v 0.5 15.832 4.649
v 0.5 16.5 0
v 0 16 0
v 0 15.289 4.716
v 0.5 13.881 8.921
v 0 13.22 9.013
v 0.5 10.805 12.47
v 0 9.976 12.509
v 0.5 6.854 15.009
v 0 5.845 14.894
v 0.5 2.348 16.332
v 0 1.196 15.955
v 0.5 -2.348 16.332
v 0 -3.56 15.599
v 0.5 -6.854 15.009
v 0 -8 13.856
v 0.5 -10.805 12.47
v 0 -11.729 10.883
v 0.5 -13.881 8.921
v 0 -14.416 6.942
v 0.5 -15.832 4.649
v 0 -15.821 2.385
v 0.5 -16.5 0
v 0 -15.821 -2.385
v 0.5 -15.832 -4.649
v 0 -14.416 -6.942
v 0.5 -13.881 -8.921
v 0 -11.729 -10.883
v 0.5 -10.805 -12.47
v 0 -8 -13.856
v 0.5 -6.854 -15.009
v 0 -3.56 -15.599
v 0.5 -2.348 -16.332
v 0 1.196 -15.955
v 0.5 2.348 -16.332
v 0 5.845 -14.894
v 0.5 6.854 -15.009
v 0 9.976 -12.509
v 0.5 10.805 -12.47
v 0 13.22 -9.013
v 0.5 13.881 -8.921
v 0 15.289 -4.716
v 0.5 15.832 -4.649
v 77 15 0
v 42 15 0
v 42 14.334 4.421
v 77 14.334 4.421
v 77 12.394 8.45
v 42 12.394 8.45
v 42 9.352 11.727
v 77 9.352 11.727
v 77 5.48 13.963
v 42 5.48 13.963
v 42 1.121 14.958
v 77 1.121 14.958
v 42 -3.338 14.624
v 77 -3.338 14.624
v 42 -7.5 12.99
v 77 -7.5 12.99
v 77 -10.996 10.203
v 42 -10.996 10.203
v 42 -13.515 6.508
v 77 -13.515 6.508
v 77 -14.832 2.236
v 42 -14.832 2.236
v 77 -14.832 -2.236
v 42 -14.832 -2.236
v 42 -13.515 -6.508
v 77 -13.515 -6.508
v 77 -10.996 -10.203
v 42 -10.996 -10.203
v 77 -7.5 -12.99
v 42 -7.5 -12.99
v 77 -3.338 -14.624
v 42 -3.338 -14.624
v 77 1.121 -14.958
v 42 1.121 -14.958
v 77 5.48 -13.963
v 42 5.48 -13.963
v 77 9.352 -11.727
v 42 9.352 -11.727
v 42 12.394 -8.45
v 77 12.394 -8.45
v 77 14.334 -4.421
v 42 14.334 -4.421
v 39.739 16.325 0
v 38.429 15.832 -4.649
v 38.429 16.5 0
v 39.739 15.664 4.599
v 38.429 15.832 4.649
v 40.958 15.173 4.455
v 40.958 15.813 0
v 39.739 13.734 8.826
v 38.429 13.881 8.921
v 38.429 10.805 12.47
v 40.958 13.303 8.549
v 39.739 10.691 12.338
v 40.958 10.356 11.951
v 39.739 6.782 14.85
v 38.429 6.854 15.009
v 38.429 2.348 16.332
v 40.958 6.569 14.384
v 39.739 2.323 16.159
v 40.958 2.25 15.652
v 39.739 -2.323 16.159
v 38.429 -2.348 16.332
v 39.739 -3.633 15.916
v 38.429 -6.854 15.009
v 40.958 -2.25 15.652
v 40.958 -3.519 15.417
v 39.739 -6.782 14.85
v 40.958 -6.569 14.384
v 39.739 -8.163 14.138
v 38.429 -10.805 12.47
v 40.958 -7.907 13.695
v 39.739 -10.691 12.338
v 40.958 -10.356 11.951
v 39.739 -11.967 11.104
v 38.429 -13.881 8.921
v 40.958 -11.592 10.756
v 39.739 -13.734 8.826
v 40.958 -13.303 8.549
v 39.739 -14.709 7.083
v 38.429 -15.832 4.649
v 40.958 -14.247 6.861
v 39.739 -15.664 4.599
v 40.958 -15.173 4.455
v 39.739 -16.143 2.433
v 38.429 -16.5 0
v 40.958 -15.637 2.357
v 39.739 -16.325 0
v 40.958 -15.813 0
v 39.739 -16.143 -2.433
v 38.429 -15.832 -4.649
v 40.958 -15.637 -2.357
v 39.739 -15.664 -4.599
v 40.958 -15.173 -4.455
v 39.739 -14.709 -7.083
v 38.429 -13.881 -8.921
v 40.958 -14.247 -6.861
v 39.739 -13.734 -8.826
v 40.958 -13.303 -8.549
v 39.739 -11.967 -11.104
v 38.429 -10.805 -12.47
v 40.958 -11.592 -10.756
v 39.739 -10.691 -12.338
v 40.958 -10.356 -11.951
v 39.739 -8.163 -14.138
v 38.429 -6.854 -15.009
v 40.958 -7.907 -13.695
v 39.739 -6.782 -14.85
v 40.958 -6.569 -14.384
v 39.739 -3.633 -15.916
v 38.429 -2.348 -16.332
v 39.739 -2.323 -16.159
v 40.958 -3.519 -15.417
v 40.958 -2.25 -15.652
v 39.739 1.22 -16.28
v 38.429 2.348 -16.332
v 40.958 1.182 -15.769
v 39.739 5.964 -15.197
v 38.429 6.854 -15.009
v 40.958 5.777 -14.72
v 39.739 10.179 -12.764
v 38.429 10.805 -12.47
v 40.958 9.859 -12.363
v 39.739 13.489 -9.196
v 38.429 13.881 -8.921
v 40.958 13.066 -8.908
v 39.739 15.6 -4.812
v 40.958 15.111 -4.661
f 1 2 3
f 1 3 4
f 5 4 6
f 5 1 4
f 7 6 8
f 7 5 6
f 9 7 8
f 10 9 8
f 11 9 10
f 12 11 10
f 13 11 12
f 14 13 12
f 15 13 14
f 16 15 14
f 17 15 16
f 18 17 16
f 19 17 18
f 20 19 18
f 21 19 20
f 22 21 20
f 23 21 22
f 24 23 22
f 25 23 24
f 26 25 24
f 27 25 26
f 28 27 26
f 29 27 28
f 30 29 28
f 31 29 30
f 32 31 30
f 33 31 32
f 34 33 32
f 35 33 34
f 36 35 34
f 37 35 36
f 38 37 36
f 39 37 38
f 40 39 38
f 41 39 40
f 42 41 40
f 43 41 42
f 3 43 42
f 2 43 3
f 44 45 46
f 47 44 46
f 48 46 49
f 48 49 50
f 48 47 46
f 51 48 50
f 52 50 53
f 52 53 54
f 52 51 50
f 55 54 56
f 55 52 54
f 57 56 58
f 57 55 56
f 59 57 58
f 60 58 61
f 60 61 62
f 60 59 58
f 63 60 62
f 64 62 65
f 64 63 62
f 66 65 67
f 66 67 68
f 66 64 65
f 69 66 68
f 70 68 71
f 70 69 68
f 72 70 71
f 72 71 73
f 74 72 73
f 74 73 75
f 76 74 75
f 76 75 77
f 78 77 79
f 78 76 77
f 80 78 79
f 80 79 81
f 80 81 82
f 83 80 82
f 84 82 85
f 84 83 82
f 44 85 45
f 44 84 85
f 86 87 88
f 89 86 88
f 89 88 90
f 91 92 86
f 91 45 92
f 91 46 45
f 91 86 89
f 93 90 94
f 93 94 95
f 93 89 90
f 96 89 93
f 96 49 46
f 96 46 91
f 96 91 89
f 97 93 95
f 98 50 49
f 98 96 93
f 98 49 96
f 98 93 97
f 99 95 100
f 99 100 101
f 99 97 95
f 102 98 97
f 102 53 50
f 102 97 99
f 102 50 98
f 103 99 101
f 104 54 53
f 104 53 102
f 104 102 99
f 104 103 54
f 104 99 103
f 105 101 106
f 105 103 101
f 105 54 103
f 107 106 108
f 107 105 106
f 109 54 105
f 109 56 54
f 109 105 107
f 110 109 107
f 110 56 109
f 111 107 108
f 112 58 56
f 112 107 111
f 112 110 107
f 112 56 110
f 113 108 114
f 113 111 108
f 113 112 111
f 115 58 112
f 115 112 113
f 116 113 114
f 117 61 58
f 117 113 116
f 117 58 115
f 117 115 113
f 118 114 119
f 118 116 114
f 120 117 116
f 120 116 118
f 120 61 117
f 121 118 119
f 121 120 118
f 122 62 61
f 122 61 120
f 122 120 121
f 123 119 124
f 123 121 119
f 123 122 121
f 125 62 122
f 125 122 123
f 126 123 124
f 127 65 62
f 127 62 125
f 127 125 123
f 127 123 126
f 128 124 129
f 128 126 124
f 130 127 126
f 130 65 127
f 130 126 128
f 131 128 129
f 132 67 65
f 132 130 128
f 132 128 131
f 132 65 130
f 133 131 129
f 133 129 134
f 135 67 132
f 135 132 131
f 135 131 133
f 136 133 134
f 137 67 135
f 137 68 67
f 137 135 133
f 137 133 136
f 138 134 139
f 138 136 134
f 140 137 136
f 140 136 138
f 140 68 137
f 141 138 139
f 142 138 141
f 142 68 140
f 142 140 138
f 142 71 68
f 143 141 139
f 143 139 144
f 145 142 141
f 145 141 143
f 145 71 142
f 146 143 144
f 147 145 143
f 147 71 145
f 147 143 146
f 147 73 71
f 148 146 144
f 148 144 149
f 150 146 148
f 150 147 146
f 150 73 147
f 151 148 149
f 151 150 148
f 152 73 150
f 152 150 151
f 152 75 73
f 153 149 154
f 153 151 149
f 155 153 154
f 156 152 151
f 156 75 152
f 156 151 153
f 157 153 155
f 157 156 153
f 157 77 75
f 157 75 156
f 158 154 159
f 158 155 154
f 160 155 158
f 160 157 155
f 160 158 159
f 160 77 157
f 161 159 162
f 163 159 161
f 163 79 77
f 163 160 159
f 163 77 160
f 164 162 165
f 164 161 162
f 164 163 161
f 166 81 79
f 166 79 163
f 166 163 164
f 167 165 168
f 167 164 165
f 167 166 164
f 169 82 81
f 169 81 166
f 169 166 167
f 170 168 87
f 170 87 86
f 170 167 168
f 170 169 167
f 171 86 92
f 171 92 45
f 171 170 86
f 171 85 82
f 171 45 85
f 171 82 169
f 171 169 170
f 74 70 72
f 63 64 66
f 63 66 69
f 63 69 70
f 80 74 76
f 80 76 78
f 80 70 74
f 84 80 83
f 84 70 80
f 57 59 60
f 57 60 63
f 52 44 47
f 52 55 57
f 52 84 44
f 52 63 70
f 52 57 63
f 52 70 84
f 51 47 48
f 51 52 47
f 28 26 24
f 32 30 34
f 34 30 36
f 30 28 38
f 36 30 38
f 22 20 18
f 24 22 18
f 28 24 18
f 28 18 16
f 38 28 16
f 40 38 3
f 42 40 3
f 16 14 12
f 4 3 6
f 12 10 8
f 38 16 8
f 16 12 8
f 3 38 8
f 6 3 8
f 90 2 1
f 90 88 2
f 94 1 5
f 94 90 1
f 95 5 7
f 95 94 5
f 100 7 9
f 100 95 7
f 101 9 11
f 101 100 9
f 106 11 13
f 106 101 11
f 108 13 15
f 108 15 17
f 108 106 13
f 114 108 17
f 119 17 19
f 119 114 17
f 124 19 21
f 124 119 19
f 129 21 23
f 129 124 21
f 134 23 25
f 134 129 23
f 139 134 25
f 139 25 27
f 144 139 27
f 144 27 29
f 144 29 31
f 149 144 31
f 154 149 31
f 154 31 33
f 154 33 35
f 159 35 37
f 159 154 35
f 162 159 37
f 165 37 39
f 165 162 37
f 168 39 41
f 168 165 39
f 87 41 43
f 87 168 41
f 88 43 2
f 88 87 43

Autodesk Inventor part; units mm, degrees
ref_plane "Start Plane" through (0, 0, 0) normal (1, 0, 0) x (0, 1, 0)
ref_plane "XZ Plane" through (0, 0, 0) normal (0, 1, 0) x (-1, 0, 0)
ref_plane "XY Plane" through (0, 0, 0) normal (0, 0, 1) x (1, 0, 0)
sketch "Main Sketch" plane through (0, 0, 0) normal (0, 0, 1) x (1, 0, 0)
  line L0 (0, 0) -> (77, 0)
  line L1 (0, 0) -> (0, 16.5)
  line L2 (42, 16.5) -> (42, 15)
  line L3 (0, 16.5) -> (42, 16.5)
  line L4 (77, 15) -> (77, 0)
  line L5 (42, 15) -> (77, 15)
  dimension "d3" = 33
  dimension "d4" = 30
revolve "Revolution1" add sketch "Main Sketch" angle 360 about axis through (0, 0, 0) along (1, 0, 0)
chamfer "Chamfer1" distance 0.5 angle 45 1 edges at (0, -16.5, 0) measured on face at (28, 16.4465, -1.3277)
fillet "Fillet1" radius 5 1 edges at (42, -16.5, 0)
equation "\"Length\" = 77"
properties part number "Shaft" material "Steel"
